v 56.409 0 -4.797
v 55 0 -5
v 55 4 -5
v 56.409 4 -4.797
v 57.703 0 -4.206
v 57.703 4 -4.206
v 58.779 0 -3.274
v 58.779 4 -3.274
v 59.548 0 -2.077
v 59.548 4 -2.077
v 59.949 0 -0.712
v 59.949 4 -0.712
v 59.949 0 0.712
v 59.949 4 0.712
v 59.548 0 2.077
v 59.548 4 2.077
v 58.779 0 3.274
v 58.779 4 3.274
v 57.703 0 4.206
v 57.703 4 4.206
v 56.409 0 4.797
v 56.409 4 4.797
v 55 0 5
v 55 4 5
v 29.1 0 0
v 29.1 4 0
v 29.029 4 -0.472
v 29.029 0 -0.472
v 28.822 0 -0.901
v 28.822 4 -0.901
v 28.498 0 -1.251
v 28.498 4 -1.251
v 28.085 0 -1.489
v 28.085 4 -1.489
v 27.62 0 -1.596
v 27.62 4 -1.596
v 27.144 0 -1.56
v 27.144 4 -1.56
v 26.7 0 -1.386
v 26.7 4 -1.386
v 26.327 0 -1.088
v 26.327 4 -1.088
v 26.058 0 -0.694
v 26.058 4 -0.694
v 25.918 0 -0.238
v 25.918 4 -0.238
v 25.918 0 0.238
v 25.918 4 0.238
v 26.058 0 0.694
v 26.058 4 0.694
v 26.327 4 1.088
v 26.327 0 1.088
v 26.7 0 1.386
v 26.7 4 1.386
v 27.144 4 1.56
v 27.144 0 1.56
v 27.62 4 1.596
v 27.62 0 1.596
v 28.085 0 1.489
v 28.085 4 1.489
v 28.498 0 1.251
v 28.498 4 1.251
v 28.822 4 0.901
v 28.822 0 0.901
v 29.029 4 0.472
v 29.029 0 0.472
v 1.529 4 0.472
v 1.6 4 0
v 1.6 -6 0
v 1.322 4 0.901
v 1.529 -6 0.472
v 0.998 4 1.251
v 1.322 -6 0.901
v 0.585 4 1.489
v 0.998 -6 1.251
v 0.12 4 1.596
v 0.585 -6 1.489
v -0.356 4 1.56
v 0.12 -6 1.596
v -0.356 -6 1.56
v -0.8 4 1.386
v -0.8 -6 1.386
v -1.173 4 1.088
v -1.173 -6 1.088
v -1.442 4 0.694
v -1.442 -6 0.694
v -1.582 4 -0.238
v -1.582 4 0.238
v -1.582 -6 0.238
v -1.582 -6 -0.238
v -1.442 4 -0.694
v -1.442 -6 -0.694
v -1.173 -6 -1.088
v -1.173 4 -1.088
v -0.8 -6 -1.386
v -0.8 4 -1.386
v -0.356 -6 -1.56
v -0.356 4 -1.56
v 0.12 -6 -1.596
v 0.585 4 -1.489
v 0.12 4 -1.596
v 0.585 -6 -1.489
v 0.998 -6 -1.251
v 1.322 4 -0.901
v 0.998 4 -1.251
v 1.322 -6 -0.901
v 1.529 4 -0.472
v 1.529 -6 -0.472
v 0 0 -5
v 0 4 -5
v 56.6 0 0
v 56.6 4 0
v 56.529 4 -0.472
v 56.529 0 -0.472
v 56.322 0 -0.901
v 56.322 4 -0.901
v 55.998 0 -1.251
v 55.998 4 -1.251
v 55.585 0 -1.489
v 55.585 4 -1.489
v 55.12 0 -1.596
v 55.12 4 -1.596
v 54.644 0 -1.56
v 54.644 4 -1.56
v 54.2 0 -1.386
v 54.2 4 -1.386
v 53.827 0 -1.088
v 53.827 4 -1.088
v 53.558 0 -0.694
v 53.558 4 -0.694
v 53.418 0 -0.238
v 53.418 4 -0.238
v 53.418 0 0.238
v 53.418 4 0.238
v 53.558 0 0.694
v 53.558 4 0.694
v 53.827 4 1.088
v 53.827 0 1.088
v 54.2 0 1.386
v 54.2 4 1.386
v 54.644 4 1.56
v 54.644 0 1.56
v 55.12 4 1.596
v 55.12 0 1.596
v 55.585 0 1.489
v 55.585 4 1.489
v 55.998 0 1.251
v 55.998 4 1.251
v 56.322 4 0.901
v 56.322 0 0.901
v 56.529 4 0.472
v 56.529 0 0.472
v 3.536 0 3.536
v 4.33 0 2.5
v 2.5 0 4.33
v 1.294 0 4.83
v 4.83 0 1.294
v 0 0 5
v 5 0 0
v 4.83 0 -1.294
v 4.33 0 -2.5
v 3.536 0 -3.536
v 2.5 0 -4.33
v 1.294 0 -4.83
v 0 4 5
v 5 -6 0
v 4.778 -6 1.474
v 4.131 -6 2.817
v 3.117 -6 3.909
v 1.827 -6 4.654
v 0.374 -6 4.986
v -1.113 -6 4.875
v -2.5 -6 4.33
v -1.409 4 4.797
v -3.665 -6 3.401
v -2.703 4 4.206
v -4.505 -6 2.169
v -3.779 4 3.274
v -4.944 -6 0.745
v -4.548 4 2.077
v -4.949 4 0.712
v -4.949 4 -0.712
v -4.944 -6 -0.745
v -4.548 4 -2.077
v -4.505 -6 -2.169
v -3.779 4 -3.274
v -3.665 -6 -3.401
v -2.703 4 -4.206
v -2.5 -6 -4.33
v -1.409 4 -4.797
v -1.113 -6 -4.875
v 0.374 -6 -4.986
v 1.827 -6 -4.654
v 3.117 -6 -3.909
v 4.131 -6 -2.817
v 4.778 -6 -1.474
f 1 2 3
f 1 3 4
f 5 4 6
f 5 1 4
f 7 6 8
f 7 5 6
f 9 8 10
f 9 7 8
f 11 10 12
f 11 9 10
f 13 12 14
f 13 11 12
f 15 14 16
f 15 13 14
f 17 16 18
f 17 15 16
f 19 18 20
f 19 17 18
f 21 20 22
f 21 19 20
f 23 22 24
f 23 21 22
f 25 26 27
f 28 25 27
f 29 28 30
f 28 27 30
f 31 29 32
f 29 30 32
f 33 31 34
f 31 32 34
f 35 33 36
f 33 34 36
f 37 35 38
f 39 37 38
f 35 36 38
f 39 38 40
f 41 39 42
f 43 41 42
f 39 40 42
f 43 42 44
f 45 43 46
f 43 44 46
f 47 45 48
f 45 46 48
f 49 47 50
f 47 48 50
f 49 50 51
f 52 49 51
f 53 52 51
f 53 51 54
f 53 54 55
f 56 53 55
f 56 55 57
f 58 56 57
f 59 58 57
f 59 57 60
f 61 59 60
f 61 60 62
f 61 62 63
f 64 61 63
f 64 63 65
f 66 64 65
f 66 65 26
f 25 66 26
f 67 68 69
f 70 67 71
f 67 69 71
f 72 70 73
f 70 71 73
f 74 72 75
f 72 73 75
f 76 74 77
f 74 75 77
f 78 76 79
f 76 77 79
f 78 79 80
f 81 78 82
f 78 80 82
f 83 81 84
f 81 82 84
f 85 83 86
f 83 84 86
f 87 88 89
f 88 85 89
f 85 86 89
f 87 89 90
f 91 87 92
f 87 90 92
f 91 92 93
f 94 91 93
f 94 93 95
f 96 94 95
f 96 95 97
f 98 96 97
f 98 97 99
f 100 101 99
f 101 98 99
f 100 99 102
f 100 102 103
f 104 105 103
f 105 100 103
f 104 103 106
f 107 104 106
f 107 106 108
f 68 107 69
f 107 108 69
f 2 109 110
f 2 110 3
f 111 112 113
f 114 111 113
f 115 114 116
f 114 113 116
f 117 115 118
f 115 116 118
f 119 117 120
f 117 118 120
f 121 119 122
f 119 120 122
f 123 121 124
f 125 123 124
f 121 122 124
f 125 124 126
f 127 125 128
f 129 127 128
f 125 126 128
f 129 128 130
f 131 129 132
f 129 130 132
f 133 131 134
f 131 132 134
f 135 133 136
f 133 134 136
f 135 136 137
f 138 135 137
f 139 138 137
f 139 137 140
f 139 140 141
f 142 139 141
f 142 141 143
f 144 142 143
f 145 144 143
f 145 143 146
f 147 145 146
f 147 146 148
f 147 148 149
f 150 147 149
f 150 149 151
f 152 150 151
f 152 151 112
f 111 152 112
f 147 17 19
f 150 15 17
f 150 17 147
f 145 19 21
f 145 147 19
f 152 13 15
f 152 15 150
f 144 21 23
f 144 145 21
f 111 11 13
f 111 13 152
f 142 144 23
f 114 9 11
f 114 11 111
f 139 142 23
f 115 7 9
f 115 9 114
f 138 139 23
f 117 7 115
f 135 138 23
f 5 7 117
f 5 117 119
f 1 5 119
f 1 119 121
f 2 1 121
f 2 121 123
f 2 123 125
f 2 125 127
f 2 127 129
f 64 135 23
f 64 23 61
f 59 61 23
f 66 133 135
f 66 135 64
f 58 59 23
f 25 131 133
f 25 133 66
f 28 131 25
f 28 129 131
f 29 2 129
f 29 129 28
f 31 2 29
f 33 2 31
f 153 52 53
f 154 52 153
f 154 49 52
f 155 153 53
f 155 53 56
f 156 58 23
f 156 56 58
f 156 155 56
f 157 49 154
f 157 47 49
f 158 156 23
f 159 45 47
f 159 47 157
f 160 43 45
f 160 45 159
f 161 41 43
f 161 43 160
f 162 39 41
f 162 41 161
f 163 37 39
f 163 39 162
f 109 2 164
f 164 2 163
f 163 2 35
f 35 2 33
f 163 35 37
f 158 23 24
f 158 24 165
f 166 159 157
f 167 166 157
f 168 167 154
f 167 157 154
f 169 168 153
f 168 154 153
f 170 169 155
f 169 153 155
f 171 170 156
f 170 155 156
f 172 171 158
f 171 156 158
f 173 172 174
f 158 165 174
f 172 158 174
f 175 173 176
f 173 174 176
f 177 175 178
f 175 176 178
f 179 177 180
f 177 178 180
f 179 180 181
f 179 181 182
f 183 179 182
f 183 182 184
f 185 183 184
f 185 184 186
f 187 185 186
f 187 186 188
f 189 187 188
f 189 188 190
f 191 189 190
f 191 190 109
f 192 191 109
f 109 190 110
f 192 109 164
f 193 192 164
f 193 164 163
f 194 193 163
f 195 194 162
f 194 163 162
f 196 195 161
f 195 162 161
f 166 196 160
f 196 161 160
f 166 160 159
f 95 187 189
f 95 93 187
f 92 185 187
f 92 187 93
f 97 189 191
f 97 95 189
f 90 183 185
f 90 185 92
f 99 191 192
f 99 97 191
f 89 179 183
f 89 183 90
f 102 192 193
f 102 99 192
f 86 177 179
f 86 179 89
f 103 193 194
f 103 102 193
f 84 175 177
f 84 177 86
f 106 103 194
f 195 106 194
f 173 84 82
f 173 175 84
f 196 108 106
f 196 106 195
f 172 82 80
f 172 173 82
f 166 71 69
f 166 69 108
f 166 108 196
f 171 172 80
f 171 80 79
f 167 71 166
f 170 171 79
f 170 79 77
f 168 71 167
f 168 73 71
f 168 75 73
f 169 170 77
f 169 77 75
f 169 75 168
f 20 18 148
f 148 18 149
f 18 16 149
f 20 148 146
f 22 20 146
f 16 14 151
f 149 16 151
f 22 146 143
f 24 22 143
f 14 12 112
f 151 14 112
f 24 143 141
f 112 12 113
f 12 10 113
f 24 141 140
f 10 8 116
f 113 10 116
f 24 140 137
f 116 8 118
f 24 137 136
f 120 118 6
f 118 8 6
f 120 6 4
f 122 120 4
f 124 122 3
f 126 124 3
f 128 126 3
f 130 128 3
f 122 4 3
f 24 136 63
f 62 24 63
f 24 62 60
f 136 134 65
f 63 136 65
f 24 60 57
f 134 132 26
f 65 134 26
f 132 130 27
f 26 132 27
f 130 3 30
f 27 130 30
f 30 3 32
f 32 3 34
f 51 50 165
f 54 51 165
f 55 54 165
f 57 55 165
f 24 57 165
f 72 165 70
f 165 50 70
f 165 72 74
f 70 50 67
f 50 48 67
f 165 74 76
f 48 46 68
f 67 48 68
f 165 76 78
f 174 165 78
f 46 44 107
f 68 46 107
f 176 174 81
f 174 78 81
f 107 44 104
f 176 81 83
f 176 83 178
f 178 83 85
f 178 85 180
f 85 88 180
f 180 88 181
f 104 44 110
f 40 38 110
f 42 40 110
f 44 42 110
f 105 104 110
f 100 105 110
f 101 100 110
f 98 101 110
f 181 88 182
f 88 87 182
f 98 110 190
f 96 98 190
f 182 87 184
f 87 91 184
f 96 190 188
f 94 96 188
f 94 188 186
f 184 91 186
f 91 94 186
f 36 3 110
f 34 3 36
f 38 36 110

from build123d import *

# Parameters (mm, degrees)
BOSS_EXTRUDE1_DEPTH = 4
SKETCH2_R           = 1.6
CUT_EXTRUDE1_DEPTH  = 5
SKETCH3_R           = 5
BOSS_EXTRUDE2_DEPTH = 6
SKETCH5_R           = 1.6
CUT_EXTRUDE2_DEPTH  = 6


with BuildPart() as part:
    # Sketch1 → Boss-Extrude1 (new body)
    with BuildSketch(Plane(origin=(0, 0, 0), x_dir=(1, 0, 0), z_dir=(0, 1, 0))):
        with BuildLine():
            Line((0, 5), (55, 5))
            ThreePointArc((55, 5), (60, 0), (55, -5))
            Line((55, -5), (0, -5))
            ThreePointArc((0, -5), (-5, 0), (0, 5))
        make_face()
    extrude(amount=BOSS_EXTRUDE1_DEPTH)

    # Sketch2 → Cut-Extrude1 (cut, through all)
    with BuildSketch(Plane(origin=(0, 4, 0), x_dir=(1, 0, 0), z_dir=(0, 1, 0))):
        Circle(SKETCH2_R)
        with Locations((27.5, 0)):
            Circle(SKETCH2_R)
        with Locations((55, 0)):
            Circle(SKETCH2_R)
    extrude(amount=-CUT_EXTRUDE1_DEPTH, mode=Mode.SUBTRACT)

    # Sketch3 → Boss-Extrude2 (add)
    with BuildSketch(Plane.XZ):
        Circle(SKETCH3_R)
    extrude(amount=BOSS_EXTRUDE2_DEPTH)

    # Sketch5 → Cut-Extrude2 (cut)
    with BuildSketch(Plane.XZ.offset(6)):
        Circle(SKETCH5_R)
    extrude(amount=-CUT_EXTRUDE2_DEPTH, mode=Mode.SUBTRACT)


solid = part.part
